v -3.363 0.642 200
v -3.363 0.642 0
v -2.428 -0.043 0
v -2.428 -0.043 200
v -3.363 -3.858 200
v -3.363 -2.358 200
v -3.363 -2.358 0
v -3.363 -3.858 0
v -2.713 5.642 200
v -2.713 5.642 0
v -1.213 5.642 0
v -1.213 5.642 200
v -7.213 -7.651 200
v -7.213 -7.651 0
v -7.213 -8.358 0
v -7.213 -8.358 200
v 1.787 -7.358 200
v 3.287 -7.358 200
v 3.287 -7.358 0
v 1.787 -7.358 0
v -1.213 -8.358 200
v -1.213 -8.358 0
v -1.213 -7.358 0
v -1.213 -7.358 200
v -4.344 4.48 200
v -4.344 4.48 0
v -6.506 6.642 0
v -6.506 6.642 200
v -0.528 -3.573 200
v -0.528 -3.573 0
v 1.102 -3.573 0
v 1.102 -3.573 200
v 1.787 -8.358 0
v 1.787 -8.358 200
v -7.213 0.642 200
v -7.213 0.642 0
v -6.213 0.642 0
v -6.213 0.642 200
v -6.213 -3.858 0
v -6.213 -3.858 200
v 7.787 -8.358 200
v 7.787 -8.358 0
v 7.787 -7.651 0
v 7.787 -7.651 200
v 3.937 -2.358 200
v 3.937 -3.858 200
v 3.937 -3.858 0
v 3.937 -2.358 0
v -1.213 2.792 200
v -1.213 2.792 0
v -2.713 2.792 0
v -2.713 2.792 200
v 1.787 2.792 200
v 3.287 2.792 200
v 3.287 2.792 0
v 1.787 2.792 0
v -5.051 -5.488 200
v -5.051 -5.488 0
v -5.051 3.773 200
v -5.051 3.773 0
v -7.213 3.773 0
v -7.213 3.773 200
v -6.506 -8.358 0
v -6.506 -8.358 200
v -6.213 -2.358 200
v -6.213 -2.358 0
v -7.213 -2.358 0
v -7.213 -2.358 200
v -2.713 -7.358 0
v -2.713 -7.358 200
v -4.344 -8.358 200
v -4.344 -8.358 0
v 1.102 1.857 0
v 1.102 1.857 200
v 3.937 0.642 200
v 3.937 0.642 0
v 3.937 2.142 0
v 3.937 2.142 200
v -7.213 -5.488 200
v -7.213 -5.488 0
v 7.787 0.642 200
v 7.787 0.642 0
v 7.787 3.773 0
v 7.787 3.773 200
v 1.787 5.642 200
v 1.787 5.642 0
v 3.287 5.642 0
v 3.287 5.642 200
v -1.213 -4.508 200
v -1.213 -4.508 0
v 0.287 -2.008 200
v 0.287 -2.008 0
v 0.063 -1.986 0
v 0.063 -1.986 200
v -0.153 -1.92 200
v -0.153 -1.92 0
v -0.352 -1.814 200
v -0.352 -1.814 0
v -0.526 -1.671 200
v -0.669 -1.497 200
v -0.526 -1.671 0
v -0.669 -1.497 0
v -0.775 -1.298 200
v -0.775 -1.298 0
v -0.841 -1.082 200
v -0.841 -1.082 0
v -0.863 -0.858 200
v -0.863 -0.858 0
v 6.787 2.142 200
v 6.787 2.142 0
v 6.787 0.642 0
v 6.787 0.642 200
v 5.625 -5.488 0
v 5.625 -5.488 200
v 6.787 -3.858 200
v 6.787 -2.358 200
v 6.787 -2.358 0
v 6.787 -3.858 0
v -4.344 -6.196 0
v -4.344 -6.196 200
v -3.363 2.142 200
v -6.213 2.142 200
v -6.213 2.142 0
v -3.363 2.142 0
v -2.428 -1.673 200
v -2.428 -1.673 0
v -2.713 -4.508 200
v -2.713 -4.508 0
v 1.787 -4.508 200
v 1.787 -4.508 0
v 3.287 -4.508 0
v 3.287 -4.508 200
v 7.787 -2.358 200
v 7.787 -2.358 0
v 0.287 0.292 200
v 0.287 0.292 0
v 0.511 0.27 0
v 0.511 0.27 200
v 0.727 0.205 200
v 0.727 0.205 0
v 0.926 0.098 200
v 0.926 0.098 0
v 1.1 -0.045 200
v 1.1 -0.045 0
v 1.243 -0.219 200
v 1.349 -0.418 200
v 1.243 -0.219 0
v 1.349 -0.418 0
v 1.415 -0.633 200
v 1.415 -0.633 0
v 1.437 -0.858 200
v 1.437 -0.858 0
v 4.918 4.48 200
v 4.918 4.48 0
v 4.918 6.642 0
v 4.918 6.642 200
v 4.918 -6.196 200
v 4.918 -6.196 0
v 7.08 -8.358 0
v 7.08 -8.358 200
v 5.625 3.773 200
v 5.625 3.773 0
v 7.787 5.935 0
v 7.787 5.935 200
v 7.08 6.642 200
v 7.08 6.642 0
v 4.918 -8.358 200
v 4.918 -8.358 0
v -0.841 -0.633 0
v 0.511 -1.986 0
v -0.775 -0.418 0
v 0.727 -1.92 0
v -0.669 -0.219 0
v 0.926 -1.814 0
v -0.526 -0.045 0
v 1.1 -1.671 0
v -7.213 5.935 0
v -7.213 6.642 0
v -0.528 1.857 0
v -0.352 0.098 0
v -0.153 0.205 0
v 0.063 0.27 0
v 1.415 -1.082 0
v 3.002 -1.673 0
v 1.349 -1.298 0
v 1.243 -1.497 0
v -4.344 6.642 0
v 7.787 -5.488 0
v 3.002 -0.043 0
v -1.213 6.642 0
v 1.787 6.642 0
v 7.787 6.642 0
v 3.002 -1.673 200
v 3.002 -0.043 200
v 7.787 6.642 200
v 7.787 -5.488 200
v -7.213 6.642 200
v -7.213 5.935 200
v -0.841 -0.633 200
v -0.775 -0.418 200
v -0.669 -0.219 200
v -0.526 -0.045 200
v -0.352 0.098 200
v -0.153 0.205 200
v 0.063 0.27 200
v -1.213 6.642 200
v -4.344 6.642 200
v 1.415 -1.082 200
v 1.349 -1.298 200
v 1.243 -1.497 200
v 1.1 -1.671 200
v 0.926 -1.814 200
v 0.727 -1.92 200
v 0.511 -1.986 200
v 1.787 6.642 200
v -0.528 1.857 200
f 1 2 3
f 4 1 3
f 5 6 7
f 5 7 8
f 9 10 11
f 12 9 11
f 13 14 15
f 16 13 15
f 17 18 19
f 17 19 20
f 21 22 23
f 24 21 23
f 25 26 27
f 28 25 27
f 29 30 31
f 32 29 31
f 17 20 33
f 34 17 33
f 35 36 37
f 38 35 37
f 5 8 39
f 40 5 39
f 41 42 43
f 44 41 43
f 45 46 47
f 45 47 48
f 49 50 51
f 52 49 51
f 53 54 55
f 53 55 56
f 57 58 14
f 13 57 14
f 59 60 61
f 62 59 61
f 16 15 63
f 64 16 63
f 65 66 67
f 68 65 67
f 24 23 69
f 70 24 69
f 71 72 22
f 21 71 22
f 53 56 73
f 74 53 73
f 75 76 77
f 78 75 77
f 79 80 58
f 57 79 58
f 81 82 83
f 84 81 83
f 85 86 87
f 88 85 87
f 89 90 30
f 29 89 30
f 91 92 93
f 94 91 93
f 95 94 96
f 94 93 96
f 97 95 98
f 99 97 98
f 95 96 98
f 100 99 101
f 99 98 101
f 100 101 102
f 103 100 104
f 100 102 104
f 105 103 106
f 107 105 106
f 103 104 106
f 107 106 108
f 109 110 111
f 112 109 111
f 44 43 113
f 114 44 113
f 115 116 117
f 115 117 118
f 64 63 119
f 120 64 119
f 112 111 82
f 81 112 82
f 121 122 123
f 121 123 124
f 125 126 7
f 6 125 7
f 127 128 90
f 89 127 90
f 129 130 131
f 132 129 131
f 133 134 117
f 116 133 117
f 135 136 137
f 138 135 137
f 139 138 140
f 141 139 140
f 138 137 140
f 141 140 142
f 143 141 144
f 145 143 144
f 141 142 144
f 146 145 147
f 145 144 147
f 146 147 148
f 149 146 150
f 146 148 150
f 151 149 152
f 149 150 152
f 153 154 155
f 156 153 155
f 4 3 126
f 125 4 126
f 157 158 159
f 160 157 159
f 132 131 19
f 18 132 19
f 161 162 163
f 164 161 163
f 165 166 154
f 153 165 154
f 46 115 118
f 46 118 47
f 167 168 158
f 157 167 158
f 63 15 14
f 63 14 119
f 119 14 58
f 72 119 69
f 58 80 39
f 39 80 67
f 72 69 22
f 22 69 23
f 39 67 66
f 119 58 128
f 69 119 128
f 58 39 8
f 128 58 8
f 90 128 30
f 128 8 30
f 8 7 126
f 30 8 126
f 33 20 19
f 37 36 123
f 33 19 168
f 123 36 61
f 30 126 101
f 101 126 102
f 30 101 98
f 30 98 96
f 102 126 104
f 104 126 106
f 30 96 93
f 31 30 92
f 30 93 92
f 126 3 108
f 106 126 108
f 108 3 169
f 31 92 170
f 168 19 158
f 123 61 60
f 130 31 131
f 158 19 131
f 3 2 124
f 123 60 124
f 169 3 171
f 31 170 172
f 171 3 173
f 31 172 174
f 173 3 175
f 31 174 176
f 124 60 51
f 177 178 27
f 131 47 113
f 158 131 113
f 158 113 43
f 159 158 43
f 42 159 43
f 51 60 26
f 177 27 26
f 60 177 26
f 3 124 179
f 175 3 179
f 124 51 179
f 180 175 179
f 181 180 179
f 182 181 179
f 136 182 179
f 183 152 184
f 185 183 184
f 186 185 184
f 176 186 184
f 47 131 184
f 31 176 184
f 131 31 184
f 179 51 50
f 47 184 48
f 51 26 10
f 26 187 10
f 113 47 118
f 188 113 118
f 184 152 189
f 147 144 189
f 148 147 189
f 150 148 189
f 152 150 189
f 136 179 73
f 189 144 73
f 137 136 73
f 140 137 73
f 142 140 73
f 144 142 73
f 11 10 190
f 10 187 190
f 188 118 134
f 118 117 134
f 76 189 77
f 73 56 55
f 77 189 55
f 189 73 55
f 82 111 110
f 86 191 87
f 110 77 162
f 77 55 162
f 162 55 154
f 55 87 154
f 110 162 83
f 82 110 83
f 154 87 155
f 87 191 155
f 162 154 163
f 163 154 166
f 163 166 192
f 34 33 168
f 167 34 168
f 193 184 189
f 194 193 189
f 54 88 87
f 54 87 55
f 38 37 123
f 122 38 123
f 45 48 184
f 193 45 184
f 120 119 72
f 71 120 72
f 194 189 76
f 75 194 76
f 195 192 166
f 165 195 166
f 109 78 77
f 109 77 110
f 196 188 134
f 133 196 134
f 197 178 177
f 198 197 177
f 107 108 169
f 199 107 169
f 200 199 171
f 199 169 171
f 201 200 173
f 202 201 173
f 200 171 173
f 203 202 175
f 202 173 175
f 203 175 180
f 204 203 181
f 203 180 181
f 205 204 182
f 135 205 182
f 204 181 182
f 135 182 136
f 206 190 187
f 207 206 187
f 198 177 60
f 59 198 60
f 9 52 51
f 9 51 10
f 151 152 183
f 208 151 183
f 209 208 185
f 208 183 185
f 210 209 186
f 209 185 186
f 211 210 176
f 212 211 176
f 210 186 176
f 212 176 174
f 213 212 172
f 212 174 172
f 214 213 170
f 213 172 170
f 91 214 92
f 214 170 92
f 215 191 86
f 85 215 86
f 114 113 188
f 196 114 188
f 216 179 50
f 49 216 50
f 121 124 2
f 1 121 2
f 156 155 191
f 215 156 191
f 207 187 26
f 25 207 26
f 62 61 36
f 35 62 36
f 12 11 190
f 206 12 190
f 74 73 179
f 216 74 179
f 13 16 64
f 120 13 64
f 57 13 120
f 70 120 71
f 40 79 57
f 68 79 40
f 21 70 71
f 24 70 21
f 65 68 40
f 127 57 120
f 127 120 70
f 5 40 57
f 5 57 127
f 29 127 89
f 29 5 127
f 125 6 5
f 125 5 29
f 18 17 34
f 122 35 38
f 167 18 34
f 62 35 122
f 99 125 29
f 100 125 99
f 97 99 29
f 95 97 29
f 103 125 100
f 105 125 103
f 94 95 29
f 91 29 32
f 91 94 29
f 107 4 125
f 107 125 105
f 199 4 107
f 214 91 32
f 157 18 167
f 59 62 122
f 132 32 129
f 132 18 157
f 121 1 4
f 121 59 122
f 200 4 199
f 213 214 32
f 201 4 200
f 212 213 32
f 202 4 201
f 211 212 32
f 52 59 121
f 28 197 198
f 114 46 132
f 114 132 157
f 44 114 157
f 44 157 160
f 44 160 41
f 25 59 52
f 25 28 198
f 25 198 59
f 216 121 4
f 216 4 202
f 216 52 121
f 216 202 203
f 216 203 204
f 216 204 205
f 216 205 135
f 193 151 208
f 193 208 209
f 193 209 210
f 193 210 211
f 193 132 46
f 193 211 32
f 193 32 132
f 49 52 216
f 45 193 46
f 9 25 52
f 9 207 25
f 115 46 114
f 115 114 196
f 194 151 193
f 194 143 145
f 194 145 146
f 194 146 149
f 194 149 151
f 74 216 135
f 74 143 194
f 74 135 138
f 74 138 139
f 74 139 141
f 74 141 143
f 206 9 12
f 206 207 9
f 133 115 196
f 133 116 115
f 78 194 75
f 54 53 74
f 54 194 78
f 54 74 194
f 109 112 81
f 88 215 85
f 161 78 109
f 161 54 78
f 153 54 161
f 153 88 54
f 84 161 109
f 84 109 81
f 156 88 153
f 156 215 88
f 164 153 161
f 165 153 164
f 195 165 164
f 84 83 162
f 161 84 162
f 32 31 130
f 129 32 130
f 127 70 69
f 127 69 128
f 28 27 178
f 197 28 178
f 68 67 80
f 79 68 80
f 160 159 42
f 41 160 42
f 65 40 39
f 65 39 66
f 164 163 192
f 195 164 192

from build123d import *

# Parameters (mm, degrees)
F1_DEPTH = 200


with BuildPart() as f1:
    # F0 (on Top) → F1 (new body)
    with BuildSketch(Plane.XY):
        Polygon((-7.213021, 3.772741), (-7.213021, 0.642155), (-6.213021, 0.642155), (-6.213021, 2.142155), (-3.363021, 2.142155), (-3.363021, 0.642155), (-2.427844, -0.042959), (-2.427844, -0.857845), (-2.427844, -1.672731), (-3.363021, -2.357845), (-3.363021, -3.857845), (-6.213021, -3.857845), (-6.213021, -2.357845), (-7.213021, -2.357845), (-7.213021, -5.488431), (-5.050714, -5.488431), (-7.213021, -7.650738), (-7.213021, -8.357845), (-6.505915, -8.357845), (-4.343607, -6.195538), (-4.343607, -8.357845), (-1.213021, -8.357845), (-1.213021, -7.357845), (-2.713021, -7.357845), (-2.713021, -4.507845), (-1.213021, -4.507845), (-0.527908, -3.572668), (0.286979, -3.572668), (1.101865, -3.572668), (1.786979, -4.507845), (3.286979, -4.507845), (3.286979, -7.357845), (1.786979, -7.357845), (1.786979, -8.357845), (4.917565, -8.357845), (4.917565, -6.195538), (7.079872, -8.357845), (7.786979, -8.357845), (7.786979, -7.650738), (5.624671, -5.488431), (7.786979, -5.488431), (7.786979, -2.357845), (6.786979, -2.357845), (6.786979, -3.857845), (3.936979, -3.857845), (3.936979, -2.357845), (3.001801, -1.672731), (3.001801, -0.857845), (3.001801, -0.042959), (3.936979, 0.642155), (3.936979, 2.142155), (6.786979, 2.142155), (6.786979, 0.642155), (7.786979, 0.642155), (7.786979, 3.772741), (5.624671, 3.772741), (7.786979, 5.935048), (7.786979, 6.642155), (7.079872, 6.642155), (4.917565, 4.479848), (4.917565, 6.642155), (1.786979, 6.642155), (1.786979, 5.642155), (3.286979, 5.642155), (3.286979, 2.792155), (1.786979, 2.792155), (1.101865, 1.856978), (0.286979, 1.856978), (-0.527908, 1.856978), (-1.213021, 2.792155), (-2.713021, 2.792155), (-2.713021, 5.642155), (-1.213021, 5.642155), (-1.213021, 6.642155), (-4.343607, 6.642155), (-4.343607, 4.479848), (-6.505915, 6.642155), (-7.213021, 6.642155), (-7.213021, 5.935048), (-5.050714, 3.772741), align=None)
        with BuildLine():
            ThreePointArc((-0.863021, -0.857845), (-0.526194, -0.044672), (0.286979, 0.292155))
            ThreePointArc((0.286979, 0.292155), (1.100151, -0.044672), (1.436979, -0.857845))
            ThreePointArc((1.436979, -0.857845), (1.100151, -1.671018), (0.286979, -2.007845))
            ThreePointArc((0.286979, -2.007845), (-0.526194, -1.671018), (-0.863021, -0.857845))
        make_face(mode=Mode.SUBTRACT)
    extrude(amount=F1_DEPTH)


solid = f1.part
